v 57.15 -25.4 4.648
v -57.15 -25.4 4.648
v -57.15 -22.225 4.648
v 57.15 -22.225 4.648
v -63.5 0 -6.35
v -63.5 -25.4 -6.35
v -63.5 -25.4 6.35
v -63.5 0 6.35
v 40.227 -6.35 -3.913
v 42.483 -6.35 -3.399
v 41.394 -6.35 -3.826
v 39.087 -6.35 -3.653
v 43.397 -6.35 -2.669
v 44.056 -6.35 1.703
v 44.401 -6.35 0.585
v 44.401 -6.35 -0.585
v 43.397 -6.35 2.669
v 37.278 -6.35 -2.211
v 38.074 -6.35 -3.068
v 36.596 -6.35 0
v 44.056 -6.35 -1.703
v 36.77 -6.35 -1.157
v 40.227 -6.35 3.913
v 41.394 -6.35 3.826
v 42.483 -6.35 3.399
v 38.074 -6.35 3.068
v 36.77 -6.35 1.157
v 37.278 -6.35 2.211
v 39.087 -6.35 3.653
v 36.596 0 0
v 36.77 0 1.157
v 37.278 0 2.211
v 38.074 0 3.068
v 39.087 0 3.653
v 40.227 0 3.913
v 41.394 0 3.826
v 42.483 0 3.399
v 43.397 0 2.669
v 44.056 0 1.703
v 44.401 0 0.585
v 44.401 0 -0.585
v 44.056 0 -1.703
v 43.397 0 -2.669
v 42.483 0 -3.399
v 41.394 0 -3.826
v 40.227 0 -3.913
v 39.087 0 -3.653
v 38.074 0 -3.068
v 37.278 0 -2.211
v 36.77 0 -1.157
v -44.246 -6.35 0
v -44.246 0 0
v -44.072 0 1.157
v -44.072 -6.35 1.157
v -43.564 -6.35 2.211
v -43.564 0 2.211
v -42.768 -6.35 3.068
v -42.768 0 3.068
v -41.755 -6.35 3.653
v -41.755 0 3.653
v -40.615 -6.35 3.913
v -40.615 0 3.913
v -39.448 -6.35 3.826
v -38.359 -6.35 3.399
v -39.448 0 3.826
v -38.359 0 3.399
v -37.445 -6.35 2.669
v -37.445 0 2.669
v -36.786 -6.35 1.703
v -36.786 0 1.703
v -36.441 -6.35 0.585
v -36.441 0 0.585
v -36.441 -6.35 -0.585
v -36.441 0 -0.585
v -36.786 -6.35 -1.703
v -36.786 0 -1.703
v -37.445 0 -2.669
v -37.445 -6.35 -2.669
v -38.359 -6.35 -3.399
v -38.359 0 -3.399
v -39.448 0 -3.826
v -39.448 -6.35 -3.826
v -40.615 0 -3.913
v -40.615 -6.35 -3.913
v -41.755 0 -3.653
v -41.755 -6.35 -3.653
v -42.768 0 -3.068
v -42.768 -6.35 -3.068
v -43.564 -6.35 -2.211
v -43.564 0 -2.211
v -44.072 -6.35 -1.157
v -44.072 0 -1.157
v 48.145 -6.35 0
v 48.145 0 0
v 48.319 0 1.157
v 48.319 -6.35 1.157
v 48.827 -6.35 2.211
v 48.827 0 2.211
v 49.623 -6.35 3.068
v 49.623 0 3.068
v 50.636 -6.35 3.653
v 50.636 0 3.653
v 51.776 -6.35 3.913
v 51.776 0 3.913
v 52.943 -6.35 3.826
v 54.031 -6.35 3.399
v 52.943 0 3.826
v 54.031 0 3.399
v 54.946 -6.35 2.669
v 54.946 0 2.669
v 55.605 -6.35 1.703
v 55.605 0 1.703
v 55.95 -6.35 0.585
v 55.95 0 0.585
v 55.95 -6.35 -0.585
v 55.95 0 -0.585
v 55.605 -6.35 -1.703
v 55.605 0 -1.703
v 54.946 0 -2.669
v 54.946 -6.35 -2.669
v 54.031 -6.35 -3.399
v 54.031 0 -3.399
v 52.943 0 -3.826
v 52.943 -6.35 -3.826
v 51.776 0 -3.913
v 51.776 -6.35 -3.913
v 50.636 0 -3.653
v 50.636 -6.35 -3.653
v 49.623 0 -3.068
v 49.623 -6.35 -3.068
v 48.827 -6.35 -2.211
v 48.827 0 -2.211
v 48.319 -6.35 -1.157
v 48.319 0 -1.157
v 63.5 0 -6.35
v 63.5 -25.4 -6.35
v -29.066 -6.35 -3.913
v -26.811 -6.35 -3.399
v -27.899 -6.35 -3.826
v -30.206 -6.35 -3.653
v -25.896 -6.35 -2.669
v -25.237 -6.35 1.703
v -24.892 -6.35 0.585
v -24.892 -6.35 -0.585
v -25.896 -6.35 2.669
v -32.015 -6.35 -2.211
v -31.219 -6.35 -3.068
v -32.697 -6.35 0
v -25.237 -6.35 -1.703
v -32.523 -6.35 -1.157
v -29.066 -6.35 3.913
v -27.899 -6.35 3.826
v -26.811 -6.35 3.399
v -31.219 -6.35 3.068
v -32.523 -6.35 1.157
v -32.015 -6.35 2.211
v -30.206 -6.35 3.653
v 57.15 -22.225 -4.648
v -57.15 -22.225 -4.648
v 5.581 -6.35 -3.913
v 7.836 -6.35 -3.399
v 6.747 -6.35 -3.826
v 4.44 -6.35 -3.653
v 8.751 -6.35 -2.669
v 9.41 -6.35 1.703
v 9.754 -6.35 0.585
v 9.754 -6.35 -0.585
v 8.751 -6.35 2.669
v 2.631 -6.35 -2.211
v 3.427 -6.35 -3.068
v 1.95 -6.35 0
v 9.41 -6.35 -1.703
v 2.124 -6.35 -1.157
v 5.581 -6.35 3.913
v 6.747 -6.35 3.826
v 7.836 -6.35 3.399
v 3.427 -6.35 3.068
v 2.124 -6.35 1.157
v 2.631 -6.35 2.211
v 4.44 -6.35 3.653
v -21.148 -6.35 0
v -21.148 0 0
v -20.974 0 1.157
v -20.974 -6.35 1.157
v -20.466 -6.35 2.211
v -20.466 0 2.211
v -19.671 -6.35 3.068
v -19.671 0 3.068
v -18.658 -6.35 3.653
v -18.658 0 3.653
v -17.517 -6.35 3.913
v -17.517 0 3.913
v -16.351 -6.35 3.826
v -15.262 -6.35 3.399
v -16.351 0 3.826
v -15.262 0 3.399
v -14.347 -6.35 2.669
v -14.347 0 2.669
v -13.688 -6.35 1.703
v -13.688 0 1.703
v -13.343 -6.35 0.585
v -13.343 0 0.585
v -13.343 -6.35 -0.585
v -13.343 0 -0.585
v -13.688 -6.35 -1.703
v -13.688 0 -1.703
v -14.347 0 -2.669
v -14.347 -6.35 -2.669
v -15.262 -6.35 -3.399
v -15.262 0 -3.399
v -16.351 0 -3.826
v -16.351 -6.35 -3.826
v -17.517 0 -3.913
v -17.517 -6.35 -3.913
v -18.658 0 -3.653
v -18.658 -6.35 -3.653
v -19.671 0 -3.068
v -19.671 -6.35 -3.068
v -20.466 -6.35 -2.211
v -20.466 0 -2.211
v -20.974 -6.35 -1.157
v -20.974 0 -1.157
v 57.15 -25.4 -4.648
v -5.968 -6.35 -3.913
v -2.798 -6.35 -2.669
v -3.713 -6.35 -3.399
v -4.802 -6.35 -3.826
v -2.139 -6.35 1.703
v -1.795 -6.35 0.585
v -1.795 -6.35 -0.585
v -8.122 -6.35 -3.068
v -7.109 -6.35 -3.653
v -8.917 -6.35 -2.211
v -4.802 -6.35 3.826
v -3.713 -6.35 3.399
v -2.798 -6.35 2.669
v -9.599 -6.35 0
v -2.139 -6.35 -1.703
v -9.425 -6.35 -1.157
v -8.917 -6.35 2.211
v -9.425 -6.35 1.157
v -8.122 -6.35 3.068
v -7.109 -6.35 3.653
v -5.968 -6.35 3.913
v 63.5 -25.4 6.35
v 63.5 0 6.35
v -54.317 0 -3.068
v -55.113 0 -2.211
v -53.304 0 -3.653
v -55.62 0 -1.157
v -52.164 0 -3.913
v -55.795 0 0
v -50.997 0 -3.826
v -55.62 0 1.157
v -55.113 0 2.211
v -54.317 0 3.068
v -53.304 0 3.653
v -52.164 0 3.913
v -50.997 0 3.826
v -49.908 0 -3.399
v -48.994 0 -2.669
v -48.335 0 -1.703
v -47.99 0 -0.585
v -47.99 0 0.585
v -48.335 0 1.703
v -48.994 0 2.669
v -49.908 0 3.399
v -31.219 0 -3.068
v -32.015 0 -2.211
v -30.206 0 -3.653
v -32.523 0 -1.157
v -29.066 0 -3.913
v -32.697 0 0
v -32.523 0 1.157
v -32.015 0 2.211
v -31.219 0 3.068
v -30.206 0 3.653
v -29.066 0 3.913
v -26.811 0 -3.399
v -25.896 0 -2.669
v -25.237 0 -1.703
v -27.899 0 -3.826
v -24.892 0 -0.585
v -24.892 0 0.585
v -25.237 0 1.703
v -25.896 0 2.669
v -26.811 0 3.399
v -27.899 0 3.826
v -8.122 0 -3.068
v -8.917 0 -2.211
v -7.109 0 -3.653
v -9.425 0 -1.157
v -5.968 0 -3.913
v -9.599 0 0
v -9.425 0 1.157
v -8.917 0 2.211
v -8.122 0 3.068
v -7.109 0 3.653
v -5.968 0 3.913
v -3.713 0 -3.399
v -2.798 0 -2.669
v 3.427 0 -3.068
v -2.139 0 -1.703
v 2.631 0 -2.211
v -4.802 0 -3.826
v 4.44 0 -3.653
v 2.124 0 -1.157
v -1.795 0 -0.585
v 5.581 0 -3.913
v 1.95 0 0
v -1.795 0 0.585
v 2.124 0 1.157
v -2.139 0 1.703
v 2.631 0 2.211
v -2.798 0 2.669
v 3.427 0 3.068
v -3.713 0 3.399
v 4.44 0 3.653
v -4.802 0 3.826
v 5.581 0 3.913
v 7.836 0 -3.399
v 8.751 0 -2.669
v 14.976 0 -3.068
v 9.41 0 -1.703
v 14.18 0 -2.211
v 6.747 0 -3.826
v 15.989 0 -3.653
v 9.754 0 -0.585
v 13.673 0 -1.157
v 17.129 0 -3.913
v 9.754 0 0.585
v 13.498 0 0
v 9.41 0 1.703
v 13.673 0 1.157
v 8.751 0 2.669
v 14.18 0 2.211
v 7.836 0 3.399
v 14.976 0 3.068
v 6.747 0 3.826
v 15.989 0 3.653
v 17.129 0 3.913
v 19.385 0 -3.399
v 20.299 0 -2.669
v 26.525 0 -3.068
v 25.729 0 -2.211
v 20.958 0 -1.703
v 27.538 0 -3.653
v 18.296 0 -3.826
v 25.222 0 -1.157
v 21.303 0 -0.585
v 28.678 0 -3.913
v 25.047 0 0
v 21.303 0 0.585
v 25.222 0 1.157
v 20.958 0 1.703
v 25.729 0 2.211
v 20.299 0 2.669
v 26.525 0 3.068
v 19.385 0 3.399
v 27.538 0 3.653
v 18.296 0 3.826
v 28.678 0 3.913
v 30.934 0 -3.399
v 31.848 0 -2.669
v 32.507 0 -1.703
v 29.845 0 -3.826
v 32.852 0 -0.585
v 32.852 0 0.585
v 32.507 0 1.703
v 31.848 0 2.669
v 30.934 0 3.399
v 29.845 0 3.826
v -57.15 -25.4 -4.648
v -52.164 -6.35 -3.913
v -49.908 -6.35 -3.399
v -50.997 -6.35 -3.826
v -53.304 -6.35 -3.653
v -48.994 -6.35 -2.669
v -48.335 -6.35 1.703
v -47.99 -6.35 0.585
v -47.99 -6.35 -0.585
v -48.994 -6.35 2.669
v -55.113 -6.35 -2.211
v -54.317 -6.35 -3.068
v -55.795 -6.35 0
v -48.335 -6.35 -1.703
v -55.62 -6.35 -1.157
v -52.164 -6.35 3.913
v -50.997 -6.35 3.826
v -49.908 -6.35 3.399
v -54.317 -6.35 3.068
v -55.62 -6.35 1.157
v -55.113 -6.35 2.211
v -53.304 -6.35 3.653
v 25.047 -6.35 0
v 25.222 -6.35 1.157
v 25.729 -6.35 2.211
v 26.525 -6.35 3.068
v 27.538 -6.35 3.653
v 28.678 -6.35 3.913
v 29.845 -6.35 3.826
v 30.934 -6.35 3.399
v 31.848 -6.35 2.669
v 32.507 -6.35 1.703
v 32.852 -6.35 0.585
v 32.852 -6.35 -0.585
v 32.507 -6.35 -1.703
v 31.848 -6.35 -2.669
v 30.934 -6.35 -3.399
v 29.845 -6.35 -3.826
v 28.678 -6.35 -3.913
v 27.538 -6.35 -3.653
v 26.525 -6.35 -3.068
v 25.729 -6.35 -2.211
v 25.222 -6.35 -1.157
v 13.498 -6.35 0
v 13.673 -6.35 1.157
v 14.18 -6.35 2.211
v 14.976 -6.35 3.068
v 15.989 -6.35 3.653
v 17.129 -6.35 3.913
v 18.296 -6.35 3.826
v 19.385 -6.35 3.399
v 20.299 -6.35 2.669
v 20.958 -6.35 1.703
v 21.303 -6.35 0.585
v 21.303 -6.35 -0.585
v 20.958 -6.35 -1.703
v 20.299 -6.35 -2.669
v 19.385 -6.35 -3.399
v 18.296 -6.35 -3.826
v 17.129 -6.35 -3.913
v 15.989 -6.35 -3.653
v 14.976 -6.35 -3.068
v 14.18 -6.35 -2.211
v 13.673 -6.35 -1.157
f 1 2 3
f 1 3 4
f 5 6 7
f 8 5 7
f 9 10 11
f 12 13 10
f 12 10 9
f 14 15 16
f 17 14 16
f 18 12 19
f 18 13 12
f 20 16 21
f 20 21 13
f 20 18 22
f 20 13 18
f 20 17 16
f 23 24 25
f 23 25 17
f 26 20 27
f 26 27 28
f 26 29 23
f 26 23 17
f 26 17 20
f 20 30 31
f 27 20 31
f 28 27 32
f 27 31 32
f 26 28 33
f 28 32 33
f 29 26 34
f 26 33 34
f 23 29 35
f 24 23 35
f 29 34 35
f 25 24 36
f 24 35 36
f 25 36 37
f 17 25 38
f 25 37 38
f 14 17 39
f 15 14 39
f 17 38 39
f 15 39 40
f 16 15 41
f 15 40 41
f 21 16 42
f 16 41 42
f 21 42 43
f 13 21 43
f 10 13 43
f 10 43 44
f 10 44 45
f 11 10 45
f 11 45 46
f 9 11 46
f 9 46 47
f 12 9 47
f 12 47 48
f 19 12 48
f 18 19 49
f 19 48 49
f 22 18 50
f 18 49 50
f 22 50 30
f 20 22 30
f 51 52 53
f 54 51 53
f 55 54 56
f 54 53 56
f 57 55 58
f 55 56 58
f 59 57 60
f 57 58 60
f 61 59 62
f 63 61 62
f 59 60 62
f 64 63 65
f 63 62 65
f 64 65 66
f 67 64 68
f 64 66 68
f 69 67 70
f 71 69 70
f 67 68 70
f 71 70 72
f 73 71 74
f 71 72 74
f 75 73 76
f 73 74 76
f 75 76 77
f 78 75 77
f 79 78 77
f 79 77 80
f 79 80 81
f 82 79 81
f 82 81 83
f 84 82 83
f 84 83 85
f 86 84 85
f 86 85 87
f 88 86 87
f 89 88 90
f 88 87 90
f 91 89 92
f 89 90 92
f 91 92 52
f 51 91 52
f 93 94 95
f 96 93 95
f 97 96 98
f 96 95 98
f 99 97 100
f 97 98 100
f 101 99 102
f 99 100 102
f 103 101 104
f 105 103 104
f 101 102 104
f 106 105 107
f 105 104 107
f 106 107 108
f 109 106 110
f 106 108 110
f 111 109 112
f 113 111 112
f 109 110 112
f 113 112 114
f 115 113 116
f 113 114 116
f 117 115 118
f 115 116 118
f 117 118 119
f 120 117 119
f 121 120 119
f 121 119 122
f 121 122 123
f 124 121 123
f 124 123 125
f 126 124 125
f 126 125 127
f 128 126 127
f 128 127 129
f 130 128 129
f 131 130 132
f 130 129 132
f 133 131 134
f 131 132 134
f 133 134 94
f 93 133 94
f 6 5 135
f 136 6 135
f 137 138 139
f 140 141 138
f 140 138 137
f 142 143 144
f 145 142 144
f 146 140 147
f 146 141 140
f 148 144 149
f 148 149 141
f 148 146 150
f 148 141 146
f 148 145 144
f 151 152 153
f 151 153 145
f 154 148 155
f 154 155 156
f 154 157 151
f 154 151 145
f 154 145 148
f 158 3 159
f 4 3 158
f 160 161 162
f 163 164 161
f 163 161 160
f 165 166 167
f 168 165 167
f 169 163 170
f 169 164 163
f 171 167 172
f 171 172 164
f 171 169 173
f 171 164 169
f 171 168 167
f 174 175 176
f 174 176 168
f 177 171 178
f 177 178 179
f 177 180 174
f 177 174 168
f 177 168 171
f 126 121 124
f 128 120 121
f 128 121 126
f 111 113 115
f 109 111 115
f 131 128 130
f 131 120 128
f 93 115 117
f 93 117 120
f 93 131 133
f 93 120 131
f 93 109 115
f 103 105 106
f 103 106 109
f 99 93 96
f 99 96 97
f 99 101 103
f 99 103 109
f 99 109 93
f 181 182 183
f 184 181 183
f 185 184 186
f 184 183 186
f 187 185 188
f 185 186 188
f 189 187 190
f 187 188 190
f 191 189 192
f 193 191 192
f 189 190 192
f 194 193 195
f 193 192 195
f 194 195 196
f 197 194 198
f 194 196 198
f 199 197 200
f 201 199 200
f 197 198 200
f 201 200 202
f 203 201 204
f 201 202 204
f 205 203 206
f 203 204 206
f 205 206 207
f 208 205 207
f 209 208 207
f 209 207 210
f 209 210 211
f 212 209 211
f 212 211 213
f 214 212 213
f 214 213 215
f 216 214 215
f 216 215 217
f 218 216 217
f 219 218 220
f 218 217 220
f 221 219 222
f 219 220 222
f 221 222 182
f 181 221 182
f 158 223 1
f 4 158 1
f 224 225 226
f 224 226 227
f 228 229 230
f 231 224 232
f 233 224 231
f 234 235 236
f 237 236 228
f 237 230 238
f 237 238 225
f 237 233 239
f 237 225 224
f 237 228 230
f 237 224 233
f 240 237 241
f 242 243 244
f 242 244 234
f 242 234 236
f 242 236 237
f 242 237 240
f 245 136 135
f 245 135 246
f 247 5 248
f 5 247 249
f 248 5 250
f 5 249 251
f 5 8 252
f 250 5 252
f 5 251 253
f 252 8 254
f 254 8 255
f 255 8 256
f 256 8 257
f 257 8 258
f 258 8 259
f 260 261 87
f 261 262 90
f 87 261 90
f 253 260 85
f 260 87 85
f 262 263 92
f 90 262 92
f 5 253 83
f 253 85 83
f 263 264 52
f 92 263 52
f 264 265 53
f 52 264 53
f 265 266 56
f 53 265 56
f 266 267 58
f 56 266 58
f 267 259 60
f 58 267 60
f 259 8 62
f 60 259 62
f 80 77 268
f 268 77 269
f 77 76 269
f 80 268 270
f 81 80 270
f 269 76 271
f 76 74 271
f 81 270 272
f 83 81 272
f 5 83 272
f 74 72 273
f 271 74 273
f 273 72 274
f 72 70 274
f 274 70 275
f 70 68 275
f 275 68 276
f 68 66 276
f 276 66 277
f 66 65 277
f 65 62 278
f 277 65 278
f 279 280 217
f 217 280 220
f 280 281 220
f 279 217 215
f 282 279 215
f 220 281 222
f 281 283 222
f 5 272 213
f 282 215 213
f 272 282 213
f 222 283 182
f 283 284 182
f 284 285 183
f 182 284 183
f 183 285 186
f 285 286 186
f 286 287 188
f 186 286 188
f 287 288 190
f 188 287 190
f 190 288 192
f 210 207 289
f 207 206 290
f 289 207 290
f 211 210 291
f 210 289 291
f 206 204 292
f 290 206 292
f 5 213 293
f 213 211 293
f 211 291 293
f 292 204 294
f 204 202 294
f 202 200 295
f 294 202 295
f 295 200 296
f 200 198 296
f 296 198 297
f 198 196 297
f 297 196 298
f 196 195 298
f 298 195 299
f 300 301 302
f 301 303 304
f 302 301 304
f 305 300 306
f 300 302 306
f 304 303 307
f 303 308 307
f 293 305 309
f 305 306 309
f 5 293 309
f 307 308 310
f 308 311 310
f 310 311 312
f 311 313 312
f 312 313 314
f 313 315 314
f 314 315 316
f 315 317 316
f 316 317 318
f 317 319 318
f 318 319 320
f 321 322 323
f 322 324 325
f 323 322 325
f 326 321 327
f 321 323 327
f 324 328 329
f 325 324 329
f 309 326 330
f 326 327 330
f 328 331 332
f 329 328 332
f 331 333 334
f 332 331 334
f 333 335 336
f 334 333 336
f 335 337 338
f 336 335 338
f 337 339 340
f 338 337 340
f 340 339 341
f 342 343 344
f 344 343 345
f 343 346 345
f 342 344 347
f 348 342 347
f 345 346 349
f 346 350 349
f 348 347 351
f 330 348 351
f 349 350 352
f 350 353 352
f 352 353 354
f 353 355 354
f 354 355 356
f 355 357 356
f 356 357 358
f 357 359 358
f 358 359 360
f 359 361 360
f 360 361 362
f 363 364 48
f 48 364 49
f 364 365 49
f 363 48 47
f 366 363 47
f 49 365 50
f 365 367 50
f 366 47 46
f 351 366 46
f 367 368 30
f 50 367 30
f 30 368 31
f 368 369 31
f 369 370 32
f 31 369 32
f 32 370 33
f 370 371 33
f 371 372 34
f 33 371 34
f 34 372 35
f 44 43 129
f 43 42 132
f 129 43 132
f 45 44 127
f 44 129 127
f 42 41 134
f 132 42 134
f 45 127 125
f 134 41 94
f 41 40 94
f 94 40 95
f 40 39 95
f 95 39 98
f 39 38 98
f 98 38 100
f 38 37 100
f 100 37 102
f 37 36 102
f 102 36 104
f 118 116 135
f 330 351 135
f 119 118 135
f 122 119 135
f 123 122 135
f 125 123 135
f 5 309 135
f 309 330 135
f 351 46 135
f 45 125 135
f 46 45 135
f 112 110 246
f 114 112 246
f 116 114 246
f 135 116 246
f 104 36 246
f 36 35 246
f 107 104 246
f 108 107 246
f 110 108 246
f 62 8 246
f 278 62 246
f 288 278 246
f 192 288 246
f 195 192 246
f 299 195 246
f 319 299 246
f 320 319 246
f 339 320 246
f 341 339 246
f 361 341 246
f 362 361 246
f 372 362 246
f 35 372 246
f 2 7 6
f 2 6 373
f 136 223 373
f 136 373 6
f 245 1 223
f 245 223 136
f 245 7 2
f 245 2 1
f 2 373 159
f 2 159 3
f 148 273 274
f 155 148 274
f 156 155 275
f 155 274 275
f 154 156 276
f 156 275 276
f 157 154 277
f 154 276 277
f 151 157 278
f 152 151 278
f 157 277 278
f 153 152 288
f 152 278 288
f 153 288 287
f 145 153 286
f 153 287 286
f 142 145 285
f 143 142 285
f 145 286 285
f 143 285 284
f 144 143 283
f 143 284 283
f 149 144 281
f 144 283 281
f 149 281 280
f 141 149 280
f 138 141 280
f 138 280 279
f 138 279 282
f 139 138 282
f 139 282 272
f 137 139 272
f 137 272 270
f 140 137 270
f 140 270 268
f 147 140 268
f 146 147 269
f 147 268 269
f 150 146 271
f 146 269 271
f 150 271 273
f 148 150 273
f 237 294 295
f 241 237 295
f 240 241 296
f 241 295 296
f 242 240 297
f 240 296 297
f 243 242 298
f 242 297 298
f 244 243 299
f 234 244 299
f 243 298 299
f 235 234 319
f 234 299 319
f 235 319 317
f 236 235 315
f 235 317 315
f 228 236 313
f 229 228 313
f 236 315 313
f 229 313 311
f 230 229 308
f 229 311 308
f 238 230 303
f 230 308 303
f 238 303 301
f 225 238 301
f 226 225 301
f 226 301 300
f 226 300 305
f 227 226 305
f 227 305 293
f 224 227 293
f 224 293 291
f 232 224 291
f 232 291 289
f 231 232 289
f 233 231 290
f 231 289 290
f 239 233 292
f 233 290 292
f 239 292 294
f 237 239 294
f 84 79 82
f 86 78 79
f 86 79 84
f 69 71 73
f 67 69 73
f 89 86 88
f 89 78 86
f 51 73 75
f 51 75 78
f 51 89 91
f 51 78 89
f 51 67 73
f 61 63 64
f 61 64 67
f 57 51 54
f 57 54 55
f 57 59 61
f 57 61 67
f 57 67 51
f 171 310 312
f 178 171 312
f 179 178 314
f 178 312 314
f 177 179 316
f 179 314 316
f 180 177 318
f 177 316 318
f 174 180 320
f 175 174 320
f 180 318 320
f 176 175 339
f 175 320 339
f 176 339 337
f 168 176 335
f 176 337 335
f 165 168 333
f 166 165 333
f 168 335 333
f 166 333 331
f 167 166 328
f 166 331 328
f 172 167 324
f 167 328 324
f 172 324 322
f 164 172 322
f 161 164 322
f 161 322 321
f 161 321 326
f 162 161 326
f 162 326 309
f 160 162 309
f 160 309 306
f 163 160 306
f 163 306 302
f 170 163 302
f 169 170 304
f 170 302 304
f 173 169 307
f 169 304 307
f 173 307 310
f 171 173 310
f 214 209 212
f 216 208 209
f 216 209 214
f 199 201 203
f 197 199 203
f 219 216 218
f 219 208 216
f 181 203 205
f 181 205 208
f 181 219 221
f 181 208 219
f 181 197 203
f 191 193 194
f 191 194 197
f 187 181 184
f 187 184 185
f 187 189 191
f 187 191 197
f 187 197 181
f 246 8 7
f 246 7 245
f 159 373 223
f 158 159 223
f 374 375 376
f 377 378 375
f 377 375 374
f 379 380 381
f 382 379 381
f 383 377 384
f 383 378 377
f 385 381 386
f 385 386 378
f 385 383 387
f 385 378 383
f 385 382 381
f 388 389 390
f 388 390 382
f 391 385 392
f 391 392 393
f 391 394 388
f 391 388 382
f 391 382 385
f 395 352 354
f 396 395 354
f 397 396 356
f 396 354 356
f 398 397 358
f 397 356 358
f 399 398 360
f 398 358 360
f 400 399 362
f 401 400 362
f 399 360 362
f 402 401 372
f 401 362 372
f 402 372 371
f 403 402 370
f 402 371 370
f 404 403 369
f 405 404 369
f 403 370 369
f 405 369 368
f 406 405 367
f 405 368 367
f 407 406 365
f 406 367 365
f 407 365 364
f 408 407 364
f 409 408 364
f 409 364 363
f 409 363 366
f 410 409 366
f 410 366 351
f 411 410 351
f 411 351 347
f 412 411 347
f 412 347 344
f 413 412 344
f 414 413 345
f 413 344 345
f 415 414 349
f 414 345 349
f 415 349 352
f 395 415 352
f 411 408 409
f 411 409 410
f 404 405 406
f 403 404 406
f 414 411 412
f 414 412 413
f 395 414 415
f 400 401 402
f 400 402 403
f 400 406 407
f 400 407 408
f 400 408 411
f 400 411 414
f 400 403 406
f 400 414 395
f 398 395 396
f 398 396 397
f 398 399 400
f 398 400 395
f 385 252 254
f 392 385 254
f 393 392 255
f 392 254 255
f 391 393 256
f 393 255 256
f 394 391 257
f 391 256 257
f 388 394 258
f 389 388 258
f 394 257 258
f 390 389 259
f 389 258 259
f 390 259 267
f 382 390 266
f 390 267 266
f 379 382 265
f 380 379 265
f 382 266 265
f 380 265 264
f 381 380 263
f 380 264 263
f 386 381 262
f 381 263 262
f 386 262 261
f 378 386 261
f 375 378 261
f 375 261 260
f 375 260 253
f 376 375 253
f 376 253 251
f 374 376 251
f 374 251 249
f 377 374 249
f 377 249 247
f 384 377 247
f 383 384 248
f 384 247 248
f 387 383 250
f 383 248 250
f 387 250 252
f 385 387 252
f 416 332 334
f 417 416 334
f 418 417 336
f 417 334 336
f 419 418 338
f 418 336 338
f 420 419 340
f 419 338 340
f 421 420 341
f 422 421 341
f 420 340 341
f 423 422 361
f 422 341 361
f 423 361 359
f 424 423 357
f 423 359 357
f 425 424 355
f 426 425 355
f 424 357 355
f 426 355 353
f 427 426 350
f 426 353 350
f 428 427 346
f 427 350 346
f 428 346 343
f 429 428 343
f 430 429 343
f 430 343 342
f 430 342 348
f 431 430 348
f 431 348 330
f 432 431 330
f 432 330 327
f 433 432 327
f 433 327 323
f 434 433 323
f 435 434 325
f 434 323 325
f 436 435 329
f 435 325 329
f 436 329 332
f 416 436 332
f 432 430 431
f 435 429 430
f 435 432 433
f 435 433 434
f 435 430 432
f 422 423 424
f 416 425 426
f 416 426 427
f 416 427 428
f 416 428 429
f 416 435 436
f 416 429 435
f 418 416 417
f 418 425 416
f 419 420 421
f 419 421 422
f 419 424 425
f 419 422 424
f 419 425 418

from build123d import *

# Parameters (mm, degrees)
F0_W     = 127
F0_H     = 12.7
F1_DEPTH = 25.4
F2_R     = 3.9243
F3_DEPTH = 6.35
F4_W     = 114.3
F4_H     = 9.2964
F5_DEPTH = 3.175


with BuildPart() as f1:
    # F0 (on Front) → F1 (new body)
    with BuildSketch(Plane.XZ):
        Rectangle(F0_W, F0_H)
    extrude(amount=F1_DEPTH)

    # F2 (on face) → F3 (cut)
    with BuildSketch(Plane(origin=(0, 0, 0), x_dir=(-1, 0, 0), z_dir=(0, 1, 0))):
        with Locations((40.321597, 0)):
            Circle(F2_R)
        with Locations((-52.069283, 0)):
            Circle(F2_R)
        with Locations((-40.520423, 0)):
            Circle(F2_R)
        with Locations((-28.971563, 0)):
            Circle(F2_R)
        with Locations((-17.422703, 0)):
            Circle(F2_R)
        with Locations((-5.873843, 0)):
            Circle(F2_R)
        with Locations((5.675017, 0)):
            Circle(F2_R)
        with Locations((17.223877, 0)):
            Circle(F2_R)
        with Locations((28.772737, 0)):
            Circle(F2_R)
        with Locations((51.870457, 0)):
            Circle(F2_R)
    extrude(amount=-F3_DEPTH, mode=Mode.SUBTRACT)

    # F4 (on face) → F5 (cut)
    with BuildSketch(Plane.XZ.offset(25.4)):
        Rectangle(F4_W, F4_H)
    extrude(amount=-F5_DEPTH, mode=Mode.SUBTRACT)


solid = f1.part
